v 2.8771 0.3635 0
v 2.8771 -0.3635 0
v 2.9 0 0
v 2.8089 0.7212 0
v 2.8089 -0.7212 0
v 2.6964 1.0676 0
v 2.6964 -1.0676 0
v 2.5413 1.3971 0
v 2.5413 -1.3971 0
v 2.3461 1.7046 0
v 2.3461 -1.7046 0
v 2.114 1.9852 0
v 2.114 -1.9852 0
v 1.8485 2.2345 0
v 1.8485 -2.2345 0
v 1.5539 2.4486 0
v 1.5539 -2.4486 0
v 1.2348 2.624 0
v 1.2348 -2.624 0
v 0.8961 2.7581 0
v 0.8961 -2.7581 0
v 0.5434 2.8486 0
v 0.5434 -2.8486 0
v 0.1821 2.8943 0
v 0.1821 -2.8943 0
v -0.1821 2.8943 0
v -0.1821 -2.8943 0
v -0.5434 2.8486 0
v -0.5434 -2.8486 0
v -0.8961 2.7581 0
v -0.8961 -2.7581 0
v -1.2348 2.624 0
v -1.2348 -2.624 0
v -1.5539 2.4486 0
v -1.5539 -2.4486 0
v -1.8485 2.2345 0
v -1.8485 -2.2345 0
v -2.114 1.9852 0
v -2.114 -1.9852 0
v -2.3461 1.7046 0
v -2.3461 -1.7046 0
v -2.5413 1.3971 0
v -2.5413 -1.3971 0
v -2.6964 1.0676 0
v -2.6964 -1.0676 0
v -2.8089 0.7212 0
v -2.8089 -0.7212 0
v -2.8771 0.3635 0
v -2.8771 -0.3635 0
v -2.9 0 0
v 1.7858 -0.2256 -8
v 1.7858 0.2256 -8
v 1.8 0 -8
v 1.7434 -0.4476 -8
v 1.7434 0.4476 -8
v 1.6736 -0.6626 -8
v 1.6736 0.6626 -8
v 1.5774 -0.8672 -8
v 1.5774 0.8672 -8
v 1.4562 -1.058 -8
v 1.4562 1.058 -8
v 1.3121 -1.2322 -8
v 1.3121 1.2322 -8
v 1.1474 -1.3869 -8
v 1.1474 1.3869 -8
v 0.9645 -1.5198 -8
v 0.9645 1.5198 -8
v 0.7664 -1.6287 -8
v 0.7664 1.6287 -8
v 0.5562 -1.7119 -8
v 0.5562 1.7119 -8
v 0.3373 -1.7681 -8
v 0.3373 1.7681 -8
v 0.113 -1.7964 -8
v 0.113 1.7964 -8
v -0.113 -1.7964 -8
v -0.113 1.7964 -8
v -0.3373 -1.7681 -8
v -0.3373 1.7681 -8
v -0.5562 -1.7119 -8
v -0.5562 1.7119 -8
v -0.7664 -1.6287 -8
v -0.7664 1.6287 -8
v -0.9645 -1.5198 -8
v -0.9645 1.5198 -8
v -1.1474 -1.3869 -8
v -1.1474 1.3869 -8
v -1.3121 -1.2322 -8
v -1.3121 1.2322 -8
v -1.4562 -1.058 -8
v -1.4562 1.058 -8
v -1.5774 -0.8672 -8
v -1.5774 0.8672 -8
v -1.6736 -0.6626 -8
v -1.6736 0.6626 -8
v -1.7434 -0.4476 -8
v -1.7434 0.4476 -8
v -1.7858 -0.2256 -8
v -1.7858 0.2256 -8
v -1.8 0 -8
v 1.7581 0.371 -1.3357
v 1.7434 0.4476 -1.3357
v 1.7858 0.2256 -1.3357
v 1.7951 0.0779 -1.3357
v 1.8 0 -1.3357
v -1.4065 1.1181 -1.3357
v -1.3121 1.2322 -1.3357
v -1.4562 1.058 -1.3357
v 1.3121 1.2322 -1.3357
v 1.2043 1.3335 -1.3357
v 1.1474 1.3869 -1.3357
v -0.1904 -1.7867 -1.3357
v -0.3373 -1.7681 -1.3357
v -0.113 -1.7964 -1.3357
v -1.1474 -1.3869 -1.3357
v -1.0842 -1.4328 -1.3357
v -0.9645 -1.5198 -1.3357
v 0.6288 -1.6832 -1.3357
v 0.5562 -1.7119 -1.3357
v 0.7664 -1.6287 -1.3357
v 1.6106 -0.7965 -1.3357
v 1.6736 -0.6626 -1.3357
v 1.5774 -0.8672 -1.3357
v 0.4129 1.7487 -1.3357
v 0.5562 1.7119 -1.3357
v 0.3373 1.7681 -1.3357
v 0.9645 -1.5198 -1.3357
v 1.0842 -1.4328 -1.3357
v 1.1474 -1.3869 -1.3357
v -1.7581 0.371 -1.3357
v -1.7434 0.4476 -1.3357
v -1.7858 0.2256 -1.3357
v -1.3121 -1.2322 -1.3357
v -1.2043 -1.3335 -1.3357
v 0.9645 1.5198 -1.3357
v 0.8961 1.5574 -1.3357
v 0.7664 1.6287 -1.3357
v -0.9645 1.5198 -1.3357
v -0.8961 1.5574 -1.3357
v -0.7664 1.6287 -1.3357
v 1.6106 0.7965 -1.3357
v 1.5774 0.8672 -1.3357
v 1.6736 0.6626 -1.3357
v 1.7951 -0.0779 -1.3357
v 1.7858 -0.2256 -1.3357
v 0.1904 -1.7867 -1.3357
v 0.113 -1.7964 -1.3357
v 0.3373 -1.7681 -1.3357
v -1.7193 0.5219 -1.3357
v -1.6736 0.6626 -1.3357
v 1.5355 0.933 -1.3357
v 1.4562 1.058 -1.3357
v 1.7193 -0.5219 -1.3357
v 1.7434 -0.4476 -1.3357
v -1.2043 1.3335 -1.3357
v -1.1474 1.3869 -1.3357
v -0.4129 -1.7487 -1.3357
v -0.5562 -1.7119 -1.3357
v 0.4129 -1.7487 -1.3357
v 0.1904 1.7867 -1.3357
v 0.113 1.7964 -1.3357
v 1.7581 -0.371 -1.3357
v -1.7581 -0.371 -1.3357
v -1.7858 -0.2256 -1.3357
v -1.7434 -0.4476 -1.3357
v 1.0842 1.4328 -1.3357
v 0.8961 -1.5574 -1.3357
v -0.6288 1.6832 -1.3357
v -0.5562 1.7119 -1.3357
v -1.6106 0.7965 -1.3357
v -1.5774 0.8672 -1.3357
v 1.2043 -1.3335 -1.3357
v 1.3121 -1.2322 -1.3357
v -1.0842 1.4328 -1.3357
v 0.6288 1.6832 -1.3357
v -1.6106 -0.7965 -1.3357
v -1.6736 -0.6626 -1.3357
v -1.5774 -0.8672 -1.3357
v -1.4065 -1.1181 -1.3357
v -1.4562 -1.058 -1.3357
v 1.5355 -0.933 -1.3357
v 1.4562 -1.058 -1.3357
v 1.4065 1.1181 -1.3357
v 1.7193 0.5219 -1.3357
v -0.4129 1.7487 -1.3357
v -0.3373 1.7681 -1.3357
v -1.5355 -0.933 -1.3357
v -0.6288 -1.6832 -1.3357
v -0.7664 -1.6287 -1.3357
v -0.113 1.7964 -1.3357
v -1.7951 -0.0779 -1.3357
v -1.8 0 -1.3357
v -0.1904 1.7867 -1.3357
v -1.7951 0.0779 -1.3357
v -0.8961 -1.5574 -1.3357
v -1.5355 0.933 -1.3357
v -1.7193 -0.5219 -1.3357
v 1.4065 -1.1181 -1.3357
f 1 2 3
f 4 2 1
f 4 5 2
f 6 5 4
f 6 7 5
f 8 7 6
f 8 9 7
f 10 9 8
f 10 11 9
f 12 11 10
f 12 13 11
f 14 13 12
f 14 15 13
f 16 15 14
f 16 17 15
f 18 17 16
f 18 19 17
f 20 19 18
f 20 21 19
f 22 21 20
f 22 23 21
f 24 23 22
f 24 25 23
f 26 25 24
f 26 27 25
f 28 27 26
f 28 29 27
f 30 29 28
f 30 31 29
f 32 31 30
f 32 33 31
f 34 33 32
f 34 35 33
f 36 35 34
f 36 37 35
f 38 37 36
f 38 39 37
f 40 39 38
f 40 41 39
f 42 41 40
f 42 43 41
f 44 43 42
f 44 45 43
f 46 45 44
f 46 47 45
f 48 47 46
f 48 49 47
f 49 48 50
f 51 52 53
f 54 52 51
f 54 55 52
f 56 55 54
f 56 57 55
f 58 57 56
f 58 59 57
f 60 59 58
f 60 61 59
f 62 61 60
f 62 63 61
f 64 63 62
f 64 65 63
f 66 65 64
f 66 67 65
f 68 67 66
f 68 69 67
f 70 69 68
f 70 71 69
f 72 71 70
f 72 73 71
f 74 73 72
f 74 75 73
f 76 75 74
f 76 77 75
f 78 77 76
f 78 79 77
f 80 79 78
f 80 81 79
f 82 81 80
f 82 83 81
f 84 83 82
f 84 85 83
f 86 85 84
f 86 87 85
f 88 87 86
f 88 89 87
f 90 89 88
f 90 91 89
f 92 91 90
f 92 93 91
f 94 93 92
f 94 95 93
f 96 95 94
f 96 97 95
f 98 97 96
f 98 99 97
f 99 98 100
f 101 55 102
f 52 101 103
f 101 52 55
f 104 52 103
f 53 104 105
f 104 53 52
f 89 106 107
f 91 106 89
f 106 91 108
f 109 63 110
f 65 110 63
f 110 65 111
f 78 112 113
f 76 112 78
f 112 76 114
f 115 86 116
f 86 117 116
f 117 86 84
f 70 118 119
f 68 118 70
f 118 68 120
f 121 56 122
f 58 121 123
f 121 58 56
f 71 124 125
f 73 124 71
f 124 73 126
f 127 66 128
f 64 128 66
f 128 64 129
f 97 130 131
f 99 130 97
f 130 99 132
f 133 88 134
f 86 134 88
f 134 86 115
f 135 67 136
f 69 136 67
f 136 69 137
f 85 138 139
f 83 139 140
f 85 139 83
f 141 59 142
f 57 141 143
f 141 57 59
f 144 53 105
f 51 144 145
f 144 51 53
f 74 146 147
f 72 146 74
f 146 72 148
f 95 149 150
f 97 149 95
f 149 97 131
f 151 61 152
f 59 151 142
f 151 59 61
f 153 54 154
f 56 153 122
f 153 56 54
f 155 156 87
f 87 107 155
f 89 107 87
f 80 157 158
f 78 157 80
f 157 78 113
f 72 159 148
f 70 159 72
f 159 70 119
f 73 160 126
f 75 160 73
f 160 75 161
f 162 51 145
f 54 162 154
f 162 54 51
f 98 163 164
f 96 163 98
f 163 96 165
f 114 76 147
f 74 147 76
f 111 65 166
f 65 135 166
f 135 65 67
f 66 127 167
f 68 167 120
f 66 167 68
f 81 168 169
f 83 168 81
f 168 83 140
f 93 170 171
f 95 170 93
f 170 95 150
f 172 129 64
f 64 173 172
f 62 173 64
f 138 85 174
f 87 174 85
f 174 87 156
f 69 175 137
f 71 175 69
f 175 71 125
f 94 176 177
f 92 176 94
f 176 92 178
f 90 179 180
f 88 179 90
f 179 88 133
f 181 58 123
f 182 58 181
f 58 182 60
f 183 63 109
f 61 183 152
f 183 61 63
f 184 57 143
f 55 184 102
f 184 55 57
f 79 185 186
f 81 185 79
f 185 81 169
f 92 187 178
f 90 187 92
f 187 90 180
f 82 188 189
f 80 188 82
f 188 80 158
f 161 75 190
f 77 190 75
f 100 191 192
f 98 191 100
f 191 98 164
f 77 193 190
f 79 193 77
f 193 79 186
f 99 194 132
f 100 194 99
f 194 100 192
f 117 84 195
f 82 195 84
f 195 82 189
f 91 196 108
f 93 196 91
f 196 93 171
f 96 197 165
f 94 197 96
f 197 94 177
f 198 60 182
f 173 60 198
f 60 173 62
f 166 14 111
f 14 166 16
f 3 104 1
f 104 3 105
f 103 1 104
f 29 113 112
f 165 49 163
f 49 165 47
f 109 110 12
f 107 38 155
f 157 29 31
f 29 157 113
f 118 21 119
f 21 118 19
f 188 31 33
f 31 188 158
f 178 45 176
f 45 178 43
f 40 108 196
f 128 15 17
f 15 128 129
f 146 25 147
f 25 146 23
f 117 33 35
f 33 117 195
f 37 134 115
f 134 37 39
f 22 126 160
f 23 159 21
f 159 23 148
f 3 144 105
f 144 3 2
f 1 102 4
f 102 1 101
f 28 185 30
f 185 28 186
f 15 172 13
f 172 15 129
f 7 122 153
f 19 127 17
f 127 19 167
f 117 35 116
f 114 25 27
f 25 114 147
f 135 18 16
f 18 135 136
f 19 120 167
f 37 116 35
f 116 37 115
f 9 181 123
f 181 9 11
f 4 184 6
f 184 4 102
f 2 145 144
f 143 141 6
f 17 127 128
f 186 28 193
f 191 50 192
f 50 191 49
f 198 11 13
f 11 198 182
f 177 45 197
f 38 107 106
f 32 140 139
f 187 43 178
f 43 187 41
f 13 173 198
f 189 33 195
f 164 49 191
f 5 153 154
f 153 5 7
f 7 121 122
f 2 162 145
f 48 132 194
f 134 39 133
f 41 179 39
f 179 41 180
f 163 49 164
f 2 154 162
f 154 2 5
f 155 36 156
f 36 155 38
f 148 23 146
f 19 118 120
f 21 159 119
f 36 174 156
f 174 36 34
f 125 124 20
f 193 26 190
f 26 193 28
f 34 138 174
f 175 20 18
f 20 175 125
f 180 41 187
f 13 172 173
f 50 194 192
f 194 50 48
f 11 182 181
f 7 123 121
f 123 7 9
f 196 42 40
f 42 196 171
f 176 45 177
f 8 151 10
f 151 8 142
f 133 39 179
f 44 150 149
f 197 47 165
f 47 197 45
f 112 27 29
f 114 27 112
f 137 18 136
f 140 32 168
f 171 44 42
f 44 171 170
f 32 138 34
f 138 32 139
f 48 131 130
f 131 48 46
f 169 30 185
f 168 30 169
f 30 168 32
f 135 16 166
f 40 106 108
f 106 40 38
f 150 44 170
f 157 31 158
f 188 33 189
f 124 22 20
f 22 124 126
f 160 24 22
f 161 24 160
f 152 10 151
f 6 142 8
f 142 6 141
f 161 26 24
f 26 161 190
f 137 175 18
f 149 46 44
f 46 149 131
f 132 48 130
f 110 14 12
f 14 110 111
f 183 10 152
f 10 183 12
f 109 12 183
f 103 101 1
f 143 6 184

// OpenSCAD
$fn = 50;


difference() {
	union() {
		translate(v = [0, 0, 0]) {
			rotate(a = [0, 0, 0]) {
				difference() {
					union() {
						translate(v = [0, 0, -8.0000000000]) {
							cylinder(h = 8, r = 1.5000000000);
						}
						translate(v = [0, 0, -8.0000000000]) {
							cylinder(h = 8, r = 1.8000000000);
						}
						translate(v = [0, 0, -1.7000000000]) {
							cylinder(h = 1.7000000000, r1 = 1.5000000000, r2 = 2.9000000000);
						}
						translate(v = [0, 0, -8.0000000000]) {
							cylinder(h = 8, r = 1.5000000000);
						}
					}
					union();
				}
			}
		}
	}
	union();
}
